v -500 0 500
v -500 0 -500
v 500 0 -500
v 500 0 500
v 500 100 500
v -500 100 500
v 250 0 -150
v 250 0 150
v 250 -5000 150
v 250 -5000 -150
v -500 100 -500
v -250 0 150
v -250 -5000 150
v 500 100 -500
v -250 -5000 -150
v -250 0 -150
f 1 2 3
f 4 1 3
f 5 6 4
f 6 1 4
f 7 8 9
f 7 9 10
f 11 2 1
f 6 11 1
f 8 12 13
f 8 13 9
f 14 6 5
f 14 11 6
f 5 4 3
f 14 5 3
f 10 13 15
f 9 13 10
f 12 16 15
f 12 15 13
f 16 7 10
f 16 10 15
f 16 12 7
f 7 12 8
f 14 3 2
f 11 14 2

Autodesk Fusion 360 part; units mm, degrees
sketch "Sketch1" plane through (0, 0, 0) normal (0, 1, 0) x (1, 0, 0)
  line L0 (500, 500) -> (-500, 500)
  line L1 (-500, 500) -> (-500, -500)
  line L2 (-500, -500) -> (500, -500)
  line L3 (500, -500) -> (500, 500)
  line L4 (500, 500) -> (-500, -500) construction
  line L5 (-500, 500) -> (500, -500) construction
  dimension "d1" = 1000
  dimension "d2" = 1000
extrude "Extrude1" add sketch "Sketch1" along normal blind 100 makes body 1 in component "WALL"
sketch "Sketch2" plane through (0, 0, 0) normal (0, -1, 0) x (1, 0, 0)
  line L0 (500, -500) -> (500, 500)
  line L1 (500, 500) -> (-500, 500)
  line L2 (-500, 500) -> (-500, -500)
  line L3 (-500, -500) -> (500, -500)
  line L4 (250, -150) -> (-250, -150)
  line L5 (-250, -150) -> (-250, 150)
  line L6 (-250, 150) -> (250, 150)
  line L7 (250, 150) -> (250, -150)
  line L8 (250, -150) -> (-250, 150) construction
  line L9 (-250, -150) -> (250, 150) construction
extrude "Extrude1'" add sketch "Sketch2" along normal blind 5000 separate body contours L4 L5 L6 L7 makes body 2 in component "BEAM"
component "WALL" placed x (1, 0, 0) y (0, 1, 0) z (0, 0, 1) at (0, 0, 0)
component "BEAM" placed x (1, 0, 0) y (0, 1, 0) z (0, 0, 1) at (0, 0, 0)
